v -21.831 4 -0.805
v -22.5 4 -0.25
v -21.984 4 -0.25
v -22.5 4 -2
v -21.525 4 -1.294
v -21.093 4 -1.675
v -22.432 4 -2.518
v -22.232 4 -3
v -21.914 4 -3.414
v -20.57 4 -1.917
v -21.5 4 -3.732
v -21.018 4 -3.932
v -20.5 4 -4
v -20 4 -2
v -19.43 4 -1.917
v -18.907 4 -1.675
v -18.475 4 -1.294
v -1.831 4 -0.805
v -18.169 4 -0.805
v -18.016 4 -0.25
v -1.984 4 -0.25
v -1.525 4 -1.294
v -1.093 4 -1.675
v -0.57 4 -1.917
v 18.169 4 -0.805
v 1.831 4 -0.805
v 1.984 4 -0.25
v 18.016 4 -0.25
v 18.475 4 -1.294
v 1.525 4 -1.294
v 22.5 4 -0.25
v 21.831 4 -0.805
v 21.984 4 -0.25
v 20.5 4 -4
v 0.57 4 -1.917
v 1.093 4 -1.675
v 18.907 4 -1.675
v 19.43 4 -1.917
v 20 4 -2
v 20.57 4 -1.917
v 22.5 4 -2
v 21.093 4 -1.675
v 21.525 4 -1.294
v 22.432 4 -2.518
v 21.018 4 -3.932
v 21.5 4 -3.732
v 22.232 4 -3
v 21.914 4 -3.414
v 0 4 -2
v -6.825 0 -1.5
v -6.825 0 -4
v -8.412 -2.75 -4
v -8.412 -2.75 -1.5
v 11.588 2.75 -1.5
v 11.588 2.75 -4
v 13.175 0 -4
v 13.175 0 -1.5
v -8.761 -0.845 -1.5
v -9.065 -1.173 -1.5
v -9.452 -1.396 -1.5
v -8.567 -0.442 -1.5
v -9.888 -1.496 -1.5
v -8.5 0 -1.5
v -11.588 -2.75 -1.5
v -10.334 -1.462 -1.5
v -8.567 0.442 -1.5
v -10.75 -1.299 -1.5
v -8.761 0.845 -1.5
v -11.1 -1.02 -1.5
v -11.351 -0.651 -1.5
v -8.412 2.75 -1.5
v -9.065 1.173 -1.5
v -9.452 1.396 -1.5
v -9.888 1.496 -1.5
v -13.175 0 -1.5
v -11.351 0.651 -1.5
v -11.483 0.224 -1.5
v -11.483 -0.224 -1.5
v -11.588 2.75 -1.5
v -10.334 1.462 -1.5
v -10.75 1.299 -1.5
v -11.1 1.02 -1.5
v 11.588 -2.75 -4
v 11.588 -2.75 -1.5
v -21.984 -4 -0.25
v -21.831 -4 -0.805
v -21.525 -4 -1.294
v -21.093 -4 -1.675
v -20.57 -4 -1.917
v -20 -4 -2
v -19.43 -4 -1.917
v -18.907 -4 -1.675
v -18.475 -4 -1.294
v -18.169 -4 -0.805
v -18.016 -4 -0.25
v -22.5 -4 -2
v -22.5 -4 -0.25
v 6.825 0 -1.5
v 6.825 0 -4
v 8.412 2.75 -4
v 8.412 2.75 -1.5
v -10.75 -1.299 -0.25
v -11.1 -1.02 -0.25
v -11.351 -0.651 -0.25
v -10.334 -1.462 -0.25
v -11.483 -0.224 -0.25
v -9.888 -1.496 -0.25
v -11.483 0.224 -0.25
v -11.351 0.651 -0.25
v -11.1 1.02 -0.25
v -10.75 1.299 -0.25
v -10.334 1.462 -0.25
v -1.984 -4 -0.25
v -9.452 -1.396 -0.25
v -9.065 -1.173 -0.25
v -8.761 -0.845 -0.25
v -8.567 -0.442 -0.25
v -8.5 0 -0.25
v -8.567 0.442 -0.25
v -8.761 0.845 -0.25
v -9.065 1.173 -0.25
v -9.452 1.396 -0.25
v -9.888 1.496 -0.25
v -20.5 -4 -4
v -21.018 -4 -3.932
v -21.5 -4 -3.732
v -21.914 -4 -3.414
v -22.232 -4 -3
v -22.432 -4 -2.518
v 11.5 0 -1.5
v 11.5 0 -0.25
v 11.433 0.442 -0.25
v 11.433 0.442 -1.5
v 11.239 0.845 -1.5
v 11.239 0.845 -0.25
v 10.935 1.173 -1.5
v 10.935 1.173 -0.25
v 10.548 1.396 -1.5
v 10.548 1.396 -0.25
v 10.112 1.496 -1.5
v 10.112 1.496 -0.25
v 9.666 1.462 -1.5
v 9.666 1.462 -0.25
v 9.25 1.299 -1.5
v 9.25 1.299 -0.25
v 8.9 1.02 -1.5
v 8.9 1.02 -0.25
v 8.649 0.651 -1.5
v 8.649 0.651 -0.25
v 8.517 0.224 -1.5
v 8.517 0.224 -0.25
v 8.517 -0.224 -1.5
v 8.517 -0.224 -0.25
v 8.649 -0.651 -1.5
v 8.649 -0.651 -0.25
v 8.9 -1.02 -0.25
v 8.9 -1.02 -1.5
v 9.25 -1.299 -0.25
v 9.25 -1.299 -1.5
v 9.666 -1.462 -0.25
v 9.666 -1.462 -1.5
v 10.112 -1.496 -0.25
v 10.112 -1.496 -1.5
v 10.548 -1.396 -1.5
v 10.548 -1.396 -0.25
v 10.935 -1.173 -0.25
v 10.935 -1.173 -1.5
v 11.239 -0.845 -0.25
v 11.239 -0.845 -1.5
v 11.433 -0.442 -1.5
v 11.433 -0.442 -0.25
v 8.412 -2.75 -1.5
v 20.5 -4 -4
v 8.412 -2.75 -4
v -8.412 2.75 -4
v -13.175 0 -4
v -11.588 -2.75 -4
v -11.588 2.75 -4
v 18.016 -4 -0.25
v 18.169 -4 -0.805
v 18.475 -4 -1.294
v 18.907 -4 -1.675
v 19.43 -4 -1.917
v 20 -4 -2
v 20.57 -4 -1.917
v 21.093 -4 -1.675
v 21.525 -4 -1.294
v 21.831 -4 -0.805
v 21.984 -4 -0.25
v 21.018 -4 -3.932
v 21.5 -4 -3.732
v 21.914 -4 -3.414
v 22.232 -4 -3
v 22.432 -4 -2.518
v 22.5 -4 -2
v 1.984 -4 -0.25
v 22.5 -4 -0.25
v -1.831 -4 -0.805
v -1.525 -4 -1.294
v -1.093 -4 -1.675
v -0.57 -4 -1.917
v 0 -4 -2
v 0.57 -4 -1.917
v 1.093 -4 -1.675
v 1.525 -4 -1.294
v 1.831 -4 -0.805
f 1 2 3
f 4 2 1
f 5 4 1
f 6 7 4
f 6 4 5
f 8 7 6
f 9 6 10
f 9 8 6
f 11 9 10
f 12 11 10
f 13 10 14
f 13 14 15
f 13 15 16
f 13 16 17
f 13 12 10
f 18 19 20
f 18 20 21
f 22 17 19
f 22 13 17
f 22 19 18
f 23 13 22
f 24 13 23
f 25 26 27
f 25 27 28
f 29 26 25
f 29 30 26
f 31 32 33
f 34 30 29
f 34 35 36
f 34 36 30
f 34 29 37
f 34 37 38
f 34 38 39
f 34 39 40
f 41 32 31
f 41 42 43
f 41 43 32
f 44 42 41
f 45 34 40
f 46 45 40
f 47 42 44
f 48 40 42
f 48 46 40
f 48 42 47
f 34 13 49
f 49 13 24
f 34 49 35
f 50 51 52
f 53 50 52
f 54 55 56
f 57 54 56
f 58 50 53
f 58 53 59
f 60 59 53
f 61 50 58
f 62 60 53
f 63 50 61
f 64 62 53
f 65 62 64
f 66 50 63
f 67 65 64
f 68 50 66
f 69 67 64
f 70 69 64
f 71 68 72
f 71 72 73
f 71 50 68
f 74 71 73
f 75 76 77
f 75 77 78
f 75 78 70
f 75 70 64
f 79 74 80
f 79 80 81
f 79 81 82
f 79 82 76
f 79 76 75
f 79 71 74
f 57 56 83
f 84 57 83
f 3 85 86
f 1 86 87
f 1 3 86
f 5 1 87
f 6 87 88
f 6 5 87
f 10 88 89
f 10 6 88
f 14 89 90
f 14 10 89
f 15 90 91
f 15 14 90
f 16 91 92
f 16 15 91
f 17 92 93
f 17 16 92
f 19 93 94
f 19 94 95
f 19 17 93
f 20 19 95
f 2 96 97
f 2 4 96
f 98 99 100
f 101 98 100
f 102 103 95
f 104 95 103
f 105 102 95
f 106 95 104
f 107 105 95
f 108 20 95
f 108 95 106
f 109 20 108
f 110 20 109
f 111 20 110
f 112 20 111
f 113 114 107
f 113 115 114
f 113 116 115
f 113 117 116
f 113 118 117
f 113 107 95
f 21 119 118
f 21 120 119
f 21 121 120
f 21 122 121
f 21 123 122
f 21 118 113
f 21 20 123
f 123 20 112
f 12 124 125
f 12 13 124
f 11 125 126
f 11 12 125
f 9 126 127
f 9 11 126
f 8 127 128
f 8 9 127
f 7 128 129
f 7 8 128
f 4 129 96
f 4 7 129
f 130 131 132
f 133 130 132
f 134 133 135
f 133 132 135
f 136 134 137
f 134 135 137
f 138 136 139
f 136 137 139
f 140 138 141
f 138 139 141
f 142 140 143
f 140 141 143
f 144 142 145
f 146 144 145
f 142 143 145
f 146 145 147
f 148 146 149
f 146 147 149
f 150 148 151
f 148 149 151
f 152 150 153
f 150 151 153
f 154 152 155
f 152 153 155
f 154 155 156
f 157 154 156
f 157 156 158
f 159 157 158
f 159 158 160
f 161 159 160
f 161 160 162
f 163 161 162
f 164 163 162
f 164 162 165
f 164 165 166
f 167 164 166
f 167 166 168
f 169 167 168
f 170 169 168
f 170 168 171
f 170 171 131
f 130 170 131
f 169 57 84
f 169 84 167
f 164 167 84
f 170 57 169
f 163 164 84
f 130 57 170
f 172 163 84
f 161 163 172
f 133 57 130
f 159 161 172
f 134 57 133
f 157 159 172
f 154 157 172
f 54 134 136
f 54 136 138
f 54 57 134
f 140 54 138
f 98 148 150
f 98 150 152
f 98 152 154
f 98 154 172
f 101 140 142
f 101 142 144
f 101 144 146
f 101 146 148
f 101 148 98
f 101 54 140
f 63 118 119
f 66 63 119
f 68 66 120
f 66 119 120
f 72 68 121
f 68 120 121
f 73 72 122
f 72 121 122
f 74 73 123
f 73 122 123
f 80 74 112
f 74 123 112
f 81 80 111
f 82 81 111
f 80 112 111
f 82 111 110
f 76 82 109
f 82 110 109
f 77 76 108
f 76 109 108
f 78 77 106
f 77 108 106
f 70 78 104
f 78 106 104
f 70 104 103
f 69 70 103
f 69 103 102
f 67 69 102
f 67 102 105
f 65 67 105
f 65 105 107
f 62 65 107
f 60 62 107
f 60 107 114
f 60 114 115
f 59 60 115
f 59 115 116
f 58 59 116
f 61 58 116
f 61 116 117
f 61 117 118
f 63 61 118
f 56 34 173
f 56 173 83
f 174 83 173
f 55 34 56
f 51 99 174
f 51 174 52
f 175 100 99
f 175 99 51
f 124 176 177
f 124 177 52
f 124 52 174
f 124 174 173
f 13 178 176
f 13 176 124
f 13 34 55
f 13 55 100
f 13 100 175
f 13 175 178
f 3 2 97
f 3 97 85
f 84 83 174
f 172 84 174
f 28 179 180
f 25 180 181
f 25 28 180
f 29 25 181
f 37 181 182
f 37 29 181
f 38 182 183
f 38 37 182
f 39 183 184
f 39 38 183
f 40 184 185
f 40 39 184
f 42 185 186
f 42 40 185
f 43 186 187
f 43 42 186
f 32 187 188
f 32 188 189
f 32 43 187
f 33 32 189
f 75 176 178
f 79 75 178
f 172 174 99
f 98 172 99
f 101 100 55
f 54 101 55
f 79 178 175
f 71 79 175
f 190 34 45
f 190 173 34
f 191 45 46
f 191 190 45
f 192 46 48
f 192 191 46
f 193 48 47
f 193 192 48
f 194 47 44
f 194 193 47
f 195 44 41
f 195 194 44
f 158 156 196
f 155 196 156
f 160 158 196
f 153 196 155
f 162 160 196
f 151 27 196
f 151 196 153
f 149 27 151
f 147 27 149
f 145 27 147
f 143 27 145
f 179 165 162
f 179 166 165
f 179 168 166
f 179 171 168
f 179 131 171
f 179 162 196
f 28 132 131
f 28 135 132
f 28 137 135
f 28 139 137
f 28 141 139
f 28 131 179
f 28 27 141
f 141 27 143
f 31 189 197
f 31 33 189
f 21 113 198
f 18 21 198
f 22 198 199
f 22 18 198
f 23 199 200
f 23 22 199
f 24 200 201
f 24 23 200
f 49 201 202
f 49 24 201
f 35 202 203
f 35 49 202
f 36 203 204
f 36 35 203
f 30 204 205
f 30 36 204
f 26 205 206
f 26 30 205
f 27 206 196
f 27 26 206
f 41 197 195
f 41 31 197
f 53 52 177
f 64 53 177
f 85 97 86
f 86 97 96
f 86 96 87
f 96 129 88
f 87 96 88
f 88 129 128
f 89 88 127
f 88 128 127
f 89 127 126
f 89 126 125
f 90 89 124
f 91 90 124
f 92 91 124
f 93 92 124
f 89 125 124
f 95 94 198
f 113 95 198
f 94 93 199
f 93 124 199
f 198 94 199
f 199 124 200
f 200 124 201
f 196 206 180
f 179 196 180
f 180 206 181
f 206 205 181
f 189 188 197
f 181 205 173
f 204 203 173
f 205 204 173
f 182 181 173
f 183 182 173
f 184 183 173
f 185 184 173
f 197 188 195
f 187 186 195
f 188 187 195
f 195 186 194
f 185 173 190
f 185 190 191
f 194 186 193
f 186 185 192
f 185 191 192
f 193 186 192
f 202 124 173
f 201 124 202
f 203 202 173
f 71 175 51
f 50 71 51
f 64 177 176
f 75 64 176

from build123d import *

# Parameters (mm, degrees)
BOSS_EXTRU_1_DEPTH      = 4
CONG_1_R                = 2
ESQUISSE2_R             = 1.5
ENL_V_MAT_EXTRU_1_DEPTH = 24.158421794
ENL_V_MAT_EXTRU_2_DEPTH = 2.5


with BuildPart() as part:
    # Esquisse1 → Boss.-Extru.1 (new, symmetric)
    with BuildSketch(Plane(origin=(0, 0, 0), x_dir=(1, 0, 0), z_dir=(0, 1, 0))):
        with BuildLine():
            Line((22.5, 4), (-22.5, 4))
            Line((-22.5, 4), (-22.5, 0.25))
            Line((-22.5, 0.25), (-21.984313483, 0.25))
            ThreePointArc((-21.984313483, 0.25), (-20, 2), (-18.015686517, 0.25))
            Line((-18.015686517, 0.25), (-1.984313483, 0.25))
            ThreePointArc((-1.984313483, 0.25), (0, 2), (1.984313483, 0.25))
            Line((1.984313483, 0.25), (18.015686517, 0.25))
            ThreePointArc((18.015686517, 0.25), (20, 2), (21.984313483, 0.25))
            Line((21.984313483, 0.25), (22.5, 0.25))
            Line((22.5, 0.25), (22.5, 4))
        make_face()
    extrude(amount=BOSS_EXTRU_1_DEPTH, both=True)

    # Congé1
    cong_1_edges = [part.edges().sort_by_distance(p)[0] for p in [
        (-22.5, 0, -4),
        (22.5, 0, -4),
    ]]
    fillet(cong_1_edges, radius=CONG_1_R)

    # Esquisse2 → Enlèv. mat.-Extru.1 (cut, through all)
    with BuildSketch(Plane.XY.offset(-0.25)):
        with Locations((-10, 0)):
            Circle(ESQUISSE2_R)
        with Locations((10, 0)):
            Circle(ESQUISSE2_R)
    extrude(amount=-ENL_V_MAT_EXTRU_1_DEPTH, mode=Mode.SUBTRACT)

    # Esquisse3 → Enlèv. mat.-Extru.2 (cut)
    with BuildSketch(Plane(origin=(0, 0, -4), x_dir=(-1, 0, 0), z_dir=(0, 0, -1))):
        Polygon((-8.41228676, 2.75), (-11.58771324, 2.75), (-13.175426481, 0), (-11.58771324, -2.75), (-8.41228676, -2.75), (-6.824573519, 0), align=None)
        Polygon((11.58771324, 2.75), (8.41228676, 2.75), (6.824573519, 0), (8.41228676, -2.75), (11.58771324, -2.75), (13.175426481, 0), align=None)
    extrude(amount=-ENL_V_MAT_EXTRU_2_DEPTH, mode=Mode.SUBTRACT)


solid = part.part
